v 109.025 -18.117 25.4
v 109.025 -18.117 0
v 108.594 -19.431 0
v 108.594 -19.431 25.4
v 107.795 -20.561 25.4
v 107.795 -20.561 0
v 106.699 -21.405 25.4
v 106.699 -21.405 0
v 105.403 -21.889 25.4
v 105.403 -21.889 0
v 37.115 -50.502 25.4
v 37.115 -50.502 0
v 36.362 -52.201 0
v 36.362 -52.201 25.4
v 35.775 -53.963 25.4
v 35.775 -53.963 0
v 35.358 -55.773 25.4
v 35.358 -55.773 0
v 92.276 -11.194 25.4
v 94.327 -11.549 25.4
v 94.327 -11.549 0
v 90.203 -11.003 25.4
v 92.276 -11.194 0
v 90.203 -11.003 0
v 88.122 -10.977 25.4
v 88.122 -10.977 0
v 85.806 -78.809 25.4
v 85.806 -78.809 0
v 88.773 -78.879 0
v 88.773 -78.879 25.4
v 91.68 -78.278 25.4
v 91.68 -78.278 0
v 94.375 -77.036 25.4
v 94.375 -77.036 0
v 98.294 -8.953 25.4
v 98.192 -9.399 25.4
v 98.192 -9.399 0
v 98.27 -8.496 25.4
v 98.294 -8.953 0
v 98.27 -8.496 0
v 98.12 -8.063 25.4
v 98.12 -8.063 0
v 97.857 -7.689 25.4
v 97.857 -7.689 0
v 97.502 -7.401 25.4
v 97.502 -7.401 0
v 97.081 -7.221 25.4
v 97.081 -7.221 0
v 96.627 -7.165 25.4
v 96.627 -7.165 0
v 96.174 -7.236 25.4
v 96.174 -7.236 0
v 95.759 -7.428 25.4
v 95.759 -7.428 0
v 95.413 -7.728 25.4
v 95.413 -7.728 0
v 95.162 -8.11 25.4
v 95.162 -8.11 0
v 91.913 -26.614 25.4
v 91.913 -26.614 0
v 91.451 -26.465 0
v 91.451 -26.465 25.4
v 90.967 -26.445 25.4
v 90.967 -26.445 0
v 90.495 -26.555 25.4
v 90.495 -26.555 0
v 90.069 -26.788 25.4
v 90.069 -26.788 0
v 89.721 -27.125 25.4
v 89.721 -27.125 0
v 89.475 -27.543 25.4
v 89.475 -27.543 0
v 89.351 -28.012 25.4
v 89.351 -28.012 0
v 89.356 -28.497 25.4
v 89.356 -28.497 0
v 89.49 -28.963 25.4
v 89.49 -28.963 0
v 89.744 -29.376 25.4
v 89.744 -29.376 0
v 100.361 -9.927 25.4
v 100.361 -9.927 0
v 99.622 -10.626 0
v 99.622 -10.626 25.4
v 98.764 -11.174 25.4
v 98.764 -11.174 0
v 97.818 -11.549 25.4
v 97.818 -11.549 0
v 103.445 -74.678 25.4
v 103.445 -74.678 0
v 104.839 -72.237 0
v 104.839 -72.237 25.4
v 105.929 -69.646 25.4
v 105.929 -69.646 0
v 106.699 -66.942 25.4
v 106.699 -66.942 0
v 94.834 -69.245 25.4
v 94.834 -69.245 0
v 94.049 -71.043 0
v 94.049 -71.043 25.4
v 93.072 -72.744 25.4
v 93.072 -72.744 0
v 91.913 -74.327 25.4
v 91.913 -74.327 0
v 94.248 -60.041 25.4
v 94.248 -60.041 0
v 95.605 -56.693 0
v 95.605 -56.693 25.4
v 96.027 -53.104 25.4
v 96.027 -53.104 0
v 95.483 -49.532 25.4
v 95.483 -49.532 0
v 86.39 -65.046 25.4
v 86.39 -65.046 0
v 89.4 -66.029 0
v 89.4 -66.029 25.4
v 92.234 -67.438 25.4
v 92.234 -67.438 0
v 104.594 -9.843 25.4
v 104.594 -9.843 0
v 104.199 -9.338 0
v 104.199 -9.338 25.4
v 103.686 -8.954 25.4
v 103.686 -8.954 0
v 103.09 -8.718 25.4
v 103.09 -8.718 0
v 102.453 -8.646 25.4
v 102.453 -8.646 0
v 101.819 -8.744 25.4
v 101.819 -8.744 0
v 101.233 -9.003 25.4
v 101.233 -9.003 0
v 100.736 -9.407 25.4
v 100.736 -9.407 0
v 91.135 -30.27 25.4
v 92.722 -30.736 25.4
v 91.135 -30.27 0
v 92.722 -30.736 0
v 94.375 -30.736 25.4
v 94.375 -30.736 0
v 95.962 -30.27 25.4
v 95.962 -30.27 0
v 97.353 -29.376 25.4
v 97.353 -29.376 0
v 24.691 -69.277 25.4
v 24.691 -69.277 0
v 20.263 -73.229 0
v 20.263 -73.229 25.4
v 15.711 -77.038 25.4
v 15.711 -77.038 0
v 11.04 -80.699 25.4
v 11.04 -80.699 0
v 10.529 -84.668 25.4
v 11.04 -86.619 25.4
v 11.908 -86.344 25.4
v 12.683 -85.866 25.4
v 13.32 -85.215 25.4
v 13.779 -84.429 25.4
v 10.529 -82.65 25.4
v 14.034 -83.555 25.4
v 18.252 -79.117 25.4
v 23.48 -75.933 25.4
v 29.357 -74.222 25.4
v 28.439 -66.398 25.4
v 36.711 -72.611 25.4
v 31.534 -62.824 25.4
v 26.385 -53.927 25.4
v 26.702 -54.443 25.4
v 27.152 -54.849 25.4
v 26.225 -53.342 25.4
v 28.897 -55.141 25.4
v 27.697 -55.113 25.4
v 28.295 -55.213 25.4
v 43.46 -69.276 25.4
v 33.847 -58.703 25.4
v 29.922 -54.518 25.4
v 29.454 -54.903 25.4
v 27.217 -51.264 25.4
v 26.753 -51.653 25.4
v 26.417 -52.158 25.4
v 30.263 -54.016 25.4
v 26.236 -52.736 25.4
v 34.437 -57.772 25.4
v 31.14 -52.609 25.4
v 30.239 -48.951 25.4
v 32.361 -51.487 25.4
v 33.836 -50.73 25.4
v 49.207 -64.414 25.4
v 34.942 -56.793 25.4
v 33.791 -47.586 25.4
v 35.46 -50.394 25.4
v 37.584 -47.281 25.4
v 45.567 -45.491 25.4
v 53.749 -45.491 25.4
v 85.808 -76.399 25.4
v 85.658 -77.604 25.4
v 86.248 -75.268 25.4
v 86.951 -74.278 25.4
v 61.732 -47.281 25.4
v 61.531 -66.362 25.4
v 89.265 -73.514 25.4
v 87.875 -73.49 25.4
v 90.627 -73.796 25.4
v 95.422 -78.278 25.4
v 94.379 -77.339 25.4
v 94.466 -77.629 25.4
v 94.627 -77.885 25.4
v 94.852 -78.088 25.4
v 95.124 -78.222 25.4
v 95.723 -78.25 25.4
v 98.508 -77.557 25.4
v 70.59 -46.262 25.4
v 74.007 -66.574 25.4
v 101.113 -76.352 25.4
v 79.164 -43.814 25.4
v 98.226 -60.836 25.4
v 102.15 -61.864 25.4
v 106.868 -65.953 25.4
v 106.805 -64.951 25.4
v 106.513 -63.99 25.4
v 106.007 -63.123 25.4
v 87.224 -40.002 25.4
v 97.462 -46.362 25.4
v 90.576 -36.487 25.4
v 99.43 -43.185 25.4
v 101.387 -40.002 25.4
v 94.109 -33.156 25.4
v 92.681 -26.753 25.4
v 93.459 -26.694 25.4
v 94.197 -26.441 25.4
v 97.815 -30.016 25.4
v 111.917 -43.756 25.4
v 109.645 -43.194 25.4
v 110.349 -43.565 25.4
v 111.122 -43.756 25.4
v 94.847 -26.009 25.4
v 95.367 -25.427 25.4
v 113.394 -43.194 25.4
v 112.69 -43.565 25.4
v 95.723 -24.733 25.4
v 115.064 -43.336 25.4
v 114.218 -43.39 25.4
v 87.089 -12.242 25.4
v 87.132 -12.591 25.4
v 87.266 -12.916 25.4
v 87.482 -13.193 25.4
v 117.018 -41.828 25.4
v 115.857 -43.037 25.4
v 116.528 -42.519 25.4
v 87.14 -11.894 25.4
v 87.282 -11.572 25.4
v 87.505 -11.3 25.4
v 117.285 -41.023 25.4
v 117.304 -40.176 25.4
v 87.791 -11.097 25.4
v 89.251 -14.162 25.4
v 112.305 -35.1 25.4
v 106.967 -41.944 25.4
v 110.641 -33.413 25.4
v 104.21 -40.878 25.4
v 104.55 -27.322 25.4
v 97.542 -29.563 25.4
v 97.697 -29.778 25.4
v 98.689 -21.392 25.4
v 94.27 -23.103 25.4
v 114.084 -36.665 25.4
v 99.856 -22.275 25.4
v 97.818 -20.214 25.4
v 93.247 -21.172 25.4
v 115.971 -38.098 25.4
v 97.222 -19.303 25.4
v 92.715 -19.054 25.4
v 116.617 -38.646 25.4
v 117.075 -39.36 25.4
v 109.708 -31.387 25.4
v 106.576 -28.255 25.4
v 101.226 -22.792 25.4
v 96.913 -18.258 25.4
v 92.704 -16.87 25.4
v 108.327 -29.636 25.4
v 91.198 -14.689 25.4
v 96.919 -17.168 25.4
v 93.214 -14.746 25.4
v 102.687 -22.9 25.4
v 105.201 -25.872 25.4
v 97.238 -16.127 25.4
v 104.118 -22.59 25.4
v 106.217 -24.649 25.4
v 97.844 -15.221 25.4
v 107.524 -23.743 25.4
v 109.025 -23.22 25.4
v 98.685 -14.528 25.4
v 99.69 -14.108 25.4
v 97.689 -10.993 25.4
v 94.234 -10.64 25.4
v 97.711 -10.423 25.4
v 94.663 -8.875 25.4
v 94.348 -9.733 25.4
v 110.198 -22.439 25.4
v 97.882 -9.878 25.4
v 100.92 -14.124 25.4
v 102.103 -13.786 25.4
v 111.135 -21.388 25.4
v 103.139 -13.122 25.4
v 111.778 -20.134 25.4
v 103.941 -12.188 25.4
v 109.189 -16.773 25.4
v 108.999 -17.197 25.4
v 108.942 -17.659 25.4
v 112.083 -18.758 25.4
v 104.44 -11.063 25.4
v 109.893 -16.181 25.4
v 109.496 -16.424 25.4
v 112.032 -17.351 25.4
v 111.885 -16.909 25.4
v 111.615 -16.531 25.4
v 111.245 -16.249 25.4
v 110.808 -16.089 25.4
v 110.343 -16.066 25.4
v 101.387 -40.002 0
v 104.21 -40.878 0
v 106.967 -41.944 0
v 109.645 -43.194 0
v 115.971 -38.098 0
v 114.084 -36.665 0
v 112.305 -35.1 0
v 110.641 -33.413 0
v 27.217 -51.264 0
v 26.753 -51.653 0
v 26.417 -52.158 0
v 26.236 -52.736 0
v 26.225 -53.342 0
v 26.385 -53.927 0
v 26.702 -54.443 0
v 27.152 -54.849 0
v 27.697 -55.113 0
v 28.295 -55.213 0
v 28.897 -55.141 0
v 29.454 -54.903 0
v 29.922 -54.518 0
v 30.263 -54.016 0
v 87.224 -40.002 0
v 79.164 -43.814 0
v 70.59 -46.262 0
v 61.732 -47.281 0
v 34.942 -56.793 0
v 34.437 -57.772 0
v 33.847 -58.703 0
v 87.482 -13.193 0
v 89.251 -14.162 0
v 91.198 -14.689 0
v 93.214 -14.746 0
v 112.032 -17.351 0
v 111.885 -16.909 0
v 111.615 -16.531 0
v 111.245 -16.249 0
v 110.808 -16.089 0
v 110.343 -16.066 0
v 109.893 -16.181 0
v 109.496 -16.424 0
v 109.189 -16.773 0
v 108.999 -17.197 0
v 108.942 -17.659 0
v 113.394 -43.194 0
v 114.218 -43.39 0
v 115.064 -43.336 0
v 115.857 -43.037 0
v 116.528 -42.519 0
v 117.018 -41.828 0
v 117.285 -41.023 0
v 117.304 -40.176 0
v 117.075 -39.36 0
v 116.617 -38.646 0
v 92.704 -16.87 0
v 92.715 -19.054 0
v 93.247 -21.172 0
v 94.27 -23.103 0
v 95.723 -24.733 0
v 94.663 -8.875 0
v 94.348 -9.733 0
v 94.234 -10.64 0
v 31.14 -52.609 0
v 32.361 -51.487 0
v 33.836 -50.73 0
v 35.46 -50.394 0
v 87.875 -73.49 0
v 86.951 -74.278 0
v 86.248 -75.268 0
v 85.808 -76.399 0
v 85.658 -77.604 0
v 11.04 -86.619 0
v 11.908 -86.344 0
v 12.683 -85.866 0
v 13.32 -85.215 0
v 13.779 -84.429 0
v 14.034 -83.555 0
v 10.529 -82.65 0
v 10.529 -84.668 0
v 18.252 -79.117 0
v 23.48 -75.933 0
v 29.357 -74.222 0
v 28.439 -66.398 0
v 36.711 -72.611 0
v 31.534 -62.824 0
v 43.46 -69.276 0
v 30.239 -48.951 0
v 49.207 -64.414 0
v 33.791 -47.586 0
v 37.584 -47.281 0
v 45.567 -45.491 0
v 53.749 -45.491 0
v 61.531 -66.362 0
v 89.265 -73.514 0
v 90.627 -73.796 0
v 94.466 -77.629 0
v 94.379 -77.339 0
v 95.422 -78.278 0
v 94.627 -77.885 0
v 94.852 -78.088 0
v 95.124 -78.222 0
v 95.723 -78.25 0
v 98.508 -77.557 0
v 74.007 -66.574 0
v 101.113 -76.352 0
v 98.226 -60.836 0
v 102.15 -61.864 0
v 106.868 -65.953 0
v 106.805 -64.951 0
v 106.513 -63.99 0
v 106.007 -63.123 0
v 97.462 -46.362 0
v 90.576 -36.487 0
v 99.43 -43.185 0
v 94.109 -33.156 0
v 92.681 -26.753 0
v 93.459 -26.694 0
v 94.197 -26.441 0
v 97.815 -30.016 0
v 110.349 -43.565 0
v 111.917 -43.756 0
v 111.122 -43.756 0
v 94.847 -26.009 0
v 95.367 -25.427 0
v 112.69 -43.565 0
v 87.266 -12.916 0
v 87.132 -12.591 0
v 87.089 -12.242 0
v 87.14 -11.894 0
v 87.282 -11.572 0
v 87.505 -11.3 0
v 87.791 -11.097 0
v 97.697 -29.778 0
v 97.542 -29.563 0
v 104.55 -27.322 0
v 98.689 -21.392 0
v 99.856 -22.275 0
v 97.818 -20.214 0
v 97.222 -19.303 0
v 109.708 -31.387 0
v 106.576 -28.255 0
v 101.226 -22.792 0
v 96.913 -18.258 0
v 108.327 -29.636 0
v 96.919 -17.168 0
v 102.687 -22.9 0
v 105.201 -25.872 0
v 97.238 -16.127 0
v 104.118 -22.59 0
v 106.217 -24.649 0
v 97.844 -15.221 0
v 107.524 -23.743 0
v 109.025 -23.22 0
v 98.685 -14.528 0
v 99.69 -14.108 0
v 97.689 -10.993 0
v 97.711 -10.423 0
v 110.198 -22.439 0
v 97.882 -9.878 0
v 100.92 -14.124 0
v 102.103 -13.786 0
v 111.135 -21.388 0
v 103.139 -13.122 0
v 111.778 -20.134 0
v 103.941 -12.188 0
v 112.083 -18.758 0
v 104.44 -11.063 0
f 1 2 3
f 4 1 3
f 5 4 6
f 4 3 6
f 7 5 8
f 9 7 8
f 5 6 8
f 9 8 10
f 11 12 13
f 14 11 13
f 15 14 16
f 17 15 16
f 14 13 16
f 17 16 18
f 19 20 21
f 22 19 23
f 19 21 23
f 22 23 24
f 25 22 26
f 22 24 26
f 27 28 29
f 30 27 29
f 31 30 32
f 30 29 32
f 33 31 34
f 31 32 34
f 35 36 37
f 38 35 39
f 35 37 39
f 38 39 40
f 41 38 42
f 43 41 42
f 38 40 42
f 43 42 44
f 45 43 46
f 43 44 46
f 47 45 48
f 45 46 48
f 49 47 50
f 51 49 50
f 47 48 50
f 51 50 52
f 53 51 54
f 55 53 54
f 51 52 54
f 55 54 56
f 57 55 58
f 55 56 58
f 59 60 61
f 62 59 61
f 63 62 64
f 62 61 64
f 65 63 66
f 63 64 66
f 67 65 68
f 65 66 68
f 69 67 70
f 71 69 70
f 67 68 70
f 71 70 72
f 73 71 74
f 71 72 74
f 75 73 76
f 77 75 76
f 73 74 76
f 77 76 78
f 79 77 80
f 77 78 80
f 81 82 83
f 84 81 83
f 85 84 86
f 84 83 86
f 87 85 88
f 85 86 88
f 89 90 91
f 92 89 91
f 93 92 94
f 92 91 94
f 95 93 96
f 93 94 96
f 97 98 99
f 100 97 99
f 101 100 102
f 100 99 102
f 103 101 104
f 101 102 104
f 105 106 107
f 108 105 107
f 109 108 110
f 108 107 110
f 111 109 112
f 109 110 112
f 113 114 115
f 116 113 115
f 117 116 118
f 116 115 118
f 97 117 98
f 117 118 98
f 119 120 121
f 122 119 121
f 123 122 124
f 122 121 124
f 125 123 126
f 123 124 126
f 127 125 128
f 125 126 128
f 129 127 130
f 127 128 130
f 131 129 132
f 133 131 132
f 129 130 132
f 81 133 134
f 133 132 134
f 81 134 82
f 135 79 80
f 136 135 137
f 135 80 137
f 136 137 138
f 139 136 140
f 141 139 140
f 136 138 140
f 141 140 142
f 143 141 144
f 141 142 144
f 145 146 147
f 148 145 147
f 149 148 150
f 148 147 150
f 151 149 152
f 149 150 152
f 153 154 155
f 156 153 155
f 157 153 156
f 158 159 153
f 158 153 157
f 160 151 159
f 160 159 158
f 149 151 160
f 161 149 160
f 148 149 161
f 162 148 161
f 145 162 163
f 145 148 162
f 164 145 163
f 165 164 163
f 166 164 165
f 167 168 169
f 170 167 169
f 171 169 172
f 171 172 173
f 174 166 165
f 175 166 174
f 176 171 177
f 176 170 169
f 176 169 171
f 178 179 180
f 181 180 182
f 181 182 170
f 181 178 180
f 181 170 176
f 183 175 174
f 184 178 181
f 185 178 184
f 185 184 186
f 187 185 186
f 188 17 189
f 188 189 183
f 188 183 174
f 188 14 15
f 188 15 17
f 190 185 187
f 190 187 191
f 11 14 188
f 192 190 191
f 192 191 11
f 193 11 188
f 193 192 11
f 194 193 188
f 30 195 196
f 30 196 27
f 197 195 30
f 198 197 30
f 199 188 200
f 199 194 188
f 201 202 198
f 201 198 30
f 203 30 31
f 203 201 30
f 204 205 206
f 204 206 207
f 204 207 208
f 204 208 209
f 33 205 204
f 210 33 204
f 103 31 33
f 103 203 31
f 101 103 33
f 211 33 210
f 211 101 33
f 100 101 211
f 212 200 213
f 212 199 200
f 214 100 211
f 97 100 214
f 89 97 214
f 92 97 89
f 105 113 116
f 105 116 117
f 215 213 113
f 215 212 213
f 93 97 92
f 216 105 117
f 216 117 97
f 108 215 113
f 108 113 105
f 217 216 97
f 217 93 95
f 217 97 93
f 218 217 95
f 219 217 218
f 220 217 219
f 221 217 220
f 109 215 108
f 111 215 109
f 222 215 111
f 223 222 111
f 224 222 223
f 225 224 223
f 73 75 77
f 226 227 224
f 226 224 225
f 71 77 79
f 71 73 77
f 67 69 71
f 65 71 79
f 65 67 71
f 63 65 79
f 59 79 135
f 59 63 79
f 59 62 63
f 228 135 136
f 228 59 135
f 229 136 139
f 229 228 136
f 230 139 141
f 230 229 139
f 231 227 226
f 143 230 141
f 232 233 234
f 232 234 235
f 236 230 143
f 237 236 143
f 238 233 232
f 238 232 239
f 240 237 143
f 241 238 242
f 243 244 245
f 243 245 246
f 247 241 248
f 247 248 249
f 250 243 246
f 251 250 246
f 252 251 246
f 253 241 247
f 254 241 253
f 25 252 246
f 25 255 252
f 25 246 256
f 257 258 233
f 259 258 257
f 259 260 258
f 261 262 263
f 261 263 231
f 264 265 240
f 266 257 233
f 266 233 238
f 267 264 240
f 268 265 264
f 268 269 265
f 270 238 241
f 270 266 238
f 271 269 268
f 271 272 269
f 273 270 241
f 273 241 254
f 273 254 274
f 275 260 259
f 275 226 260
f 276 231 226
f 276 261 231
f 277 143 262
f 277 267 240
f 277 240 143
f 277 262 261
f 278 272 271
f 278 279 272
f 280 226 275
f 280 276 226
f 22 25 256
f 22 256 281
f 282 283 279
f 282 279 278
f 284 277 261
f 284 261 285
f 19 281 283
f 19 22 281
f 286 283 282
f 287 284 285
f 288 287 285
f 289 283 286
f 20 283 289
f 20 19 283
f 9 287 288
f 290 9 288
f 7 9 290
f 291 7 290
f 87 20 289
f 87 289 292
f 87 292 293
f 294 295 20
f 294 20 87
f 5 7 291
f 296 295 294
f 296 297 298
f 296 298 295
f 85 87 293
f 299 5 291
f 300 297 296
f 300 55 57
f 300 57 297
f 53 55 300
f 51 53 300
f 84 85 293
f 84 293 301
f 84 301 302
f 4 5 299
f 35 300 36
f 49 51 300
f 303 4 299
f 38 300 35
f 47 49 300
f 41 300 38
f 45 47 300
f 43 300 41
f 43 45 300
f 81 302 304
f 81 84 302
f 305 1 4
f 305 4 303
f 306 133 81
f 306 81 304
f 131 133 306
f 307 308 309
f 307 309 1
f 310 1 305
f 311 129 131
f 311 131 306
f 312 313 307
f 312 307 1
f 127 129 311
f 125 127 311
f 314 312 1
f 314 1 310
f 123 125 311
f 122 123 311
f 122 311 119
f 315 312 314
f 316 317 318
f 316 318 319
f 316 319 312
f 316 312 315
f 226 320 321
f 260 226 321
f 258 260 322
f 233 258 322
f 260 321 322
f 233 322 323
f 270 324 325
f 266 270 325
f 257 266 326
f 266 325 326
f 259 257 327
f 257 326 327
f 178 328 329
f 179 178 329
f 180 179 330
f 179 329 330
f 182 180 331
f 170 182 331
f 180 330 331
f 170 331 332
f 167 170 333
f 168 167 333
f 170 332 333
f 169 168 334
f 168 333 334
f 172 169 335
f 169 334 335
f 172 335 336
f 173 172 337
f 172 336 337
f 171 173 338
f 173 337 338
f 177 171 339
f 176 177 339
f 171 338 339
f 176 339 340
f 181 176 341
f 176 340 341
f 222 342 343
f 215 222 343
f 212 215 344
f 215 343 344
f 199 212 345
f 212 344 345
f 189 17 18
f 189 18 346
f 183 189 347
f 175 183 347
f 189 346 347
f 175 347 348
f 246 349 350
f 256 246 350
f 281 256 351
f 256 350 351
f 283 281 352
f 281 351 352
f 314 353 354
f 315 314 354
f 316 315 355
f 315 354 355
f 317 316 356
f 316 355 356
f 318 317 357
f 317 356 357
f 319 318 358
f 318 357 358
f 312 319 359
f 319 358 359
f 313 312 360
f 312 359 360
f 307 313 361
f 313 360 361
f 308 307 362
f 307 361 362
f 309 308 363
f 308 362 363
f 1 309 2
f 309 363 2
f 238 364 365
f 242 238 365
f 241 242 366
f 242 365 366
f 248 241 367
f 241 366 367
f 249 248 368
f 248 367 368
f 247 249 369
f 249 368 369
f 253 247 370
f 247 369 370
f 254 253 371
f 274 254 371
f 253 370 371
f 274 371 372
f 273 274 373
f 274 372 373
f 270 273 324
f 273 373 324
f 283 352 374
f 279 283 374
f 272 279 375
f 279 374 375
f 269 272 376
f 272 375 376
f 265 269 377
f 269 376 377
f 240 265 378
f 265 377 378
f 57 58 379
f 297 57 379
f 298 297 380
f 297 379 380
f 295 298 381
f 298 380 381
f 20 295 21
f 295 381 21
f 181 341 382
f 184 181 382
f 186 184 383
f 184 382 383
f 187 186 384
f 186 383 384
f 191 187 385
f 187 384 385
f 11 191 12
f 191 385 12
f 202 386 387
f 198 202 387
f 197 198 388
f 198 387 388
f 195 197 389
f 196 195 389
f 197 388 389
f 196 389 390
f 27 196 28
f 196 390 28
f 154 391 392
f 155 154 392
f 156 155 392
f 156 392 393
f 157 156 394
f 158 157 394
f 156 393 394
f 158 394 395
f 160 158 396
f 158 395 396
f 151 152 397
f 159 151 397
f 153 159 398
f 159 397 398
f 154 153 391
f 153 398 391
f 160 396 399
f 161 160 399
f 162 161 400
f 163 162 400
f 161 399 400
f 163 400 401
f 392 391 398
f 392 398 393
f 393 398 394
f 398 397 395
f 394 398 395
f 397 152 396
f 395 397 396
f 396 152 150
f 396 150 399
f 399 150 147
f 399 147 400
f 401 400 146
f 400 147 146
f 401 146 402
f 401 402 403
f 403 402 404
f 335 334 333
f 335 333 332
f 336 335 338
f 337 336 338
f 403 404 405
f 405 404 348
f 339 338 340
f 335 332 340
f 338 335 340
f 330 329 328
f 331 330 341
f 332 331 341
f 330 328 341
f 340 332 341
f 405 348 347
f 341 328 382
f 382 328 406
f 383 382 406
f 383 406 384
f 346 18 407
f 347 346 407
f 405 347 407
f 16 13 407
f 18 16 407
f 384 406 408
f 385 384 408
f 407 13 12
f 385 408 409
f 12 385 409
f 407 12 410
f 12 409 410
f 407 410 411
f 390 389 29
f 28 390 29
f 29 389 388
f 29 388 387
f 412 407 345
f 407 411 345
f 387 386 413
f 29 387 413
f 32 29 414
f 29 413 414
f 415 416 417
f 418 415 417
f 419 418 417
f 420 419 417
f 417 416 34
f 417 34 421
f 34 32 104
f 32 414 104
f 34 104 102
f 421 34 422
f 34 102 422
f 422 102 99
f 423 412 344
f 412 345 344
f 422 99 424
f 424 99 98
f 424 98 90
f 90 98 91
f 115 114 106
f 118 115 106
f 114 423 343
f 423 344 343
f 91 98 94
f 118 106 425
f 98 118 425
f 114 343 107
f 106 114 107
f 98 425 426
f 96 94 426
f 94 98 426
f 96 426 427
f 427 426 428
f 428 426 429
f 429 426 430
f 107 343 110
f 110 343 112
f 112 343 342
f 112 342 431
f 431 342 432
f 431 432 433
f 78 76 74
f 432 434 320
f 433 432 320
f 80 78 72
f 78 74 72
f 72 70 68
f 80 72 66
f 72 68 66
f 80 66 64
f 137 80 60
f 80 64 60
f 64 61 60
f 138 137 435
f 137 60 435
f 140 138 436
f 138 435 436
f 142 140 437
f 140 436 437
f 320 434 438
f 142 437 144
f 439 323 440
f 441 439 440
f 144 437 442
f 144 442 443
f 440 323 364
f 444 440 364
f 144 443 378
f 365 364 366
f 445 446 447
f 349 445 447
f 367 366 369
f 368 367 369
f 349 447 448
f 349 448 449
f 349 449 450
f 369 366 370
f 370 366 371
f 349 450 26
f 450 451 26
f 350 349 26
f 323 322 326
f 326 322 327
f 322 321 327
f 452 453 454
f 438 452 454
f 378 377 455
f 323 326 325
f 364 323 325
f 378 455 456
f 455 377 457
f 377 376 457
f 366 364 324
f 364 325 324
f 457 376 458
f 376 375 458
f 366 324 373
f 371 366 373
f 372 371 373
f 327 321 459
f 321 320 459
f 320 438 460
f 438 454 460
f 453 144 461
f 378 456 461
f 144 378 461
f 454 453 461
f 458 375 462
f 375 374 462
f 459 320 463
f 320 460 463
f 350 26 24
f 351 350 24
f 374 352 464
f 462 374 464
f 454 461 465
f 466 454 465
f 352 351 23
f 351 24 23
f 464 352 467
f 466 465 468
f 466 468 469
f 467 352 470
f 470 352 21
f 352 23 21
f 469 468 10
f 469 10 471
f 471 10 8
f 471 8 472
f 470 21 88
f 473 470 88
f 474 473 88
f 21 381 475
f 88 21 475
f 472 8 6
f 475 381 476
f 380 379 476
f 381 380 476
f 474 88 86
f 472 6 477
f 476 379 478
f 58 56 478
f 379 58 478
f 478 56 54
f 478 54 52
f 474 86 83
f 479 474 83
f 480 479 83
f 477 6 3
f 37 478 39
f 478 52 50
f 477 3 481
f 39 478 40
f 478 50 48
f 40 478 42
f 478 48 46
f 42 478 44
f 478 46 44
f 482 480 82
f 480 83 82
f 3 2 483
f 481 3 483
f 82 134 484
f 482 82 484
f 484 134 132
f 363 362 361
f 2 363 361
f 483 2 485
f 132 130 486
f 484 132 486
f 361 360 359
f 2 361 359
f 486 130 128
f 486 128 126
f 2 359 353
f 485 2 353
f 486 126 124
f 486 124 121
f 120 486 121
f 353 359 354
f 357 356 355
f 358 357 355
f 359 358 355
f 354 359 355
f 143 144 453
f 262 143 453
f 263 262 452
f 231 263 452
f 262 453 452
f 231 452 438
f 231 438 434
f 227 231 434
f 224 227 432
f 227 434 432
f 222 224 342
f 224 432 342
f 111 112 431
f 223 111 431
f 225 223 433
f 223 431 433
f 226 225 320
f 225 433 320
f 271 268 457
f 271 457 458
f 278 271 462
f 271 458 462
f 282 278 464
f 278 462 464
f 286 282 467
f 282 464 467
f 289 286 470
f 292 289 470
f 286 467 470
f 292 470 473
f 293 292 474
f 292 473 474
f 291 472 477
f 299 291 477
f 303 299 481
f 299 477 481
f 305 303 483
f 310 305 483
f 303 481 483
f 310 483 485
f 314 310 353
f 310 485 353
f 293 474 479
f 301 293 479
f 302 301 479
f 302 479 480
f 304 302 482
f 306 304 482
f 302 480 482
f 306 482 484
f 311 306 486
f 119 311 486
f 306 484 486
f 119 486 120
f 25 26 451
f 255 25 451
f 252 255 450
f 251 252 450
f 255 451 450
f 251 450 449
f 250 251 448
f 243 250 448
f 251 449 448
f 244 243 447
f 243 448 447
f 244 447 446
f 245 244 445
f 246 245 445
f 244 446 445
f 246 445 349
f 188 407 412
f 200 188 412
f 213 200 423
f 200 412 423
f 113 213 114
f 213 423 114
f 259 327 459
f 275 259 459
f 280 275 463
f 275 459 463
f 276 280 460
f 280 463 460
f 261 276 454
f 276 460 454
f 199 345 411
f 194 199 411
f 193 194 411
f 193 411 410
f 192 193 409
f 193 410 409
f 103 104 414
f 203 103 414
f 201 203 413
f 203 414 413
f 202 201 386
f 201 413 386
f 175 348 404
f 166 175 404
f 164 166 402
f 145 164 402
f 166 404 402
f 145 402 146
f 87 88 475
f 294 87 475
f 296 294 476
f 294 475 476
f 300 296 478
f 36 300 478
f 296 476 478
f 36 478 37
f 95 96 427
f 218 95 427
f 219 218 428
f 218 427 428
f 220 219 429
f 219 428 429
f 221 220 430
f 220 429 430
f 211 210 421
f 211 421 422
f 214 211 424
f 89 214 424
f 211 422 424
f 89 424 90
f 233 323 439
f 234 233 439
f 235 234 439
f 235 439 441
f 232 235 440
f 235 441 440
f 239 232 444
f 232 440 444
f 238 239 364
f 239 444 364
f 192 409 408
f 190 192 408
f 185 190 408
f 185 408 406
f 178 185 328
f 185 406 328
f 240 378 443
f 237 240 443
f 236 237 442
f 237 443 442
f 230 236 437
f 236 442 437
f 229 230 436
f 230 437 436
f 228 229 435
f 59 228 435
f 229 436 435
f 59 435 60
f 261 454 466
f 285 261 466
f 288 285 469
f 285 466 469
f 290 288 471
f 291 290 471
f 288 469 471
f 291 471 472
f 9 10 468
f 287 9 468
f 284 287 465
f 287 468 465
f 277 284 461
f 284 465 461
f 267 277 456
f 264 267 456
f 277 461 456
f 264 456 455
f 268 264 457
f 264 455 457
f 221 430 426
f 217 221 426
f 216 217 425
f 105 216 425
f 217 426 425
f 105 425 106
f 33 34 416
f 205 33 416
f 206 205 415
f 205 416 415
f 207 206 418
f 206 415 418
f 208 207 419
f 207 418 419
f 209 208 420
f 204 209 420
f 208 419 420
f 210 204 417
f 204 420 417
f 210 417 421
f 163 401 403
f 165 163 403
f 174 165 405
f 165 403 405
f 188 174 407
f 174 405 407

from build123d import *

# Parameters (mm, degrees)
F1_DEPTH = 25.4


with BuildPart() as f1:
    # F0 (on Top) → F1 (new body)
    with BuildSketch(Plane.XY):
        with BuildLine():
            ThreePointArc((35.357989, -55.773497), (34.700263, -57.288462), (33.846916, -58.702506))
            ThreePointArc((33.846916, -58.702506), (30.076924, -64.689377), (24.690598, -69.276638))
            ThreePointArc((24.690598, -69.276638), (18.00206, -75.151493), (11.039559, -80.69893))
            ThreePointArc((11.039559, -80.69893), (10.464903, -83.658978), (11.039559, -86.619027))
            ThreePointArc((11.039559, -86.619027), (13.021343, -85.560107), (14.03443, -83.554506))
            ThreePointArc((14.03443, -83.554506), (20.760438, -77.35253), (29.357025, -74.221656))
            ThreePointArc((29.357025, -74.221656), (40.186668, -71.149018), (49.206674, -64.413905))
            ThreePointArc((49.206674, -64.413905), (67.765139, -66.686066), (86.39013, -65.046228))
            ThreePointArc((86.39013, -65.046228), (90.842719, -66.681712), (94.834223, -69.244571))
            ThreePointArc((94.834223, -69.244571), (93.58406, -71.906754), (91.913037, -74.327044))
            ThreePointArc((91.913037, -74.327044), (89.952947, -73.623328), (87.874644, -73.489815))
            ThreePointArc((87.874644, -73.489815), (85.993248, -75.819788), (85.806198, -78.808673))
            ThreePointArc((85.806198, -78.808673), (90.243806, -78.661543), (94.375476, -77.035718))
            ThreePointArc((94.375476, -77.035718), (94.732683, -77.994564), (95.723428, -78.250311))
            ThreePointArc((95.723428, -78.250311), (99.839405, -77.015924), (103.444606, -74.677654))
            ThreePointArc((103.444606, -74.677654), (105.422994, -70.957733), (106.698684, -66.942208))
            ThreePointArc((106.698684, -66.942208), (106.805126, -64.950848), (106.006868, -63.123383))
            ThreePointArc((106.006868, -63.123383), (100.195754, -61.321046), (94.247706, -60.04113))
            ThreePointArc((94.247706, -60.04113), (95.936674, -54.912618), (95.482543, -49.532283))
            ThreePointArc((95.482543, -49.532283), (98.447384, -44.774679), (101.387411, -40.001702))
            ThreePointArc((101.387411, -40.001702), (105.597536, -41.38767), (109.645344, -43.193579))
            ThreePointArc((109.645344, -43.193579), (111.519486, -43.779772), (113.393627, -43.193579))
            ThreePointArc((113.393627, -43.193579), (117.01848, -41.827539), (115.970574, -38.098261))
            ThreePointArc((115.970574, -38.098261), (113.180417, -35.898183), (110.64098, -33.412911))
            ThreePointArc((110.64098, -33.412911), (108.327022, -29.635914), (104.550026, -27.321953))
            ThreePointArc((104.550026, -27.321953), (106.217319, -24.648898), (109.025061, -23.220027))
            ThreePointArc((109.025061, -23.220027), (111.496496, -20.781246), (112.031601, -17.350603))
            ThreePointArc((112.031601, -17.350603), (110.113696, -16.106507), (109.025061, -18.116733))
            ThreePointArc((109.025061, -18.116733), (107.794978, -20.560822), (105.402686, -21.888833))
            ThreePointArc((105.402686, -21.888833), (101.226365, -22.791684), (97.81839, -20.214379))
            ThreePointArc((97.81839, -20.214379), (97.040255, -16.635745), (99.689841, -14.107542))
            ThreePointArc((99.689841, -14.107542), (103.139321, -13.121868), (104.59435, -9.842637))
            ThreePointArc((104.59435, -9.842637), (102.452988, -8.646448), (100.360706, -9.926547))
            ThreePointArc((100.360706, -9.926547), (99.206159, -10.920505), (97.81839, -11.549016))
            ThreePointArc((97.81839, -11.549016), (97.7106, -10.42277), (98.19214, -9.39897))
            ThreePointArc((98.19214, -9.39897), (97.297537, -7.296311), (95.162444, -8.110479))
            ThreePointArc((95.162444, -8.110479), (94.347536, -9.733247), (94.326667, -11.549016))
            ThreePointArc((94.326667, -11.549016), (91.24145, -11.077832), (88.122092, -10.976911))
            ThreePointArc((88.122092, -10.976911), (87.140114, -11.893801), (87.481856, -13.193102))
            ThreePointArc((87.481856, -13.193102), (90.208654, -14.483161), (93.213789, -14.745539))
            ThreePointArc((93.213789, -14.745539), (92.91737, -20.129205), (95.723428, -24.733309))
            ThreePointArc((95.723428, -24.733309), (94.196841, -26.440721), (91.913037, -26.613809))
            ThreePointArc((91.913037, -26.613809), (89.720804, -27.125156), (89.744188, -29.376114))
            ThreePointArc((89.744188, -29.376114), (93.548656, -30.795), (97.353123, -29.376114))
            ThreePointArc((97.353123, -29.376114), (97.623646, -29.667451), (97.814836, -30.016029))
            ThreePointArc((97.814836, -30.016029), (92.320304, -34.797902), (87.223575, -40.001702))
            ThreePointArc((87.223575, -40.001702), (74.926958, -45.213773), (61.732344, -47.281299))
            ThreePointArc((61.732344, -47.281299), (49.657937, -45.265171), (37.58353, -47.281299))
            ThreePointArc((37.58353, -47.281299), (31.965668, -48.141093), (27.217193, -51.263846))
            ThreePointArc((27.217193, -51.263846), (26.912313, -54.662213), (30.26267, -54.01649))
            ThreePointArc((30.26267, -54.01649), (33.073036, -51.058678), (37.114996, -50.502479))
            ThreePointArc((37.114996, -50.502479), (36.047411, -53.074961), (35.357989, -55.773497))
        make_face()
    extrude(amount=F1_DEPTH)


solid = f1.part
